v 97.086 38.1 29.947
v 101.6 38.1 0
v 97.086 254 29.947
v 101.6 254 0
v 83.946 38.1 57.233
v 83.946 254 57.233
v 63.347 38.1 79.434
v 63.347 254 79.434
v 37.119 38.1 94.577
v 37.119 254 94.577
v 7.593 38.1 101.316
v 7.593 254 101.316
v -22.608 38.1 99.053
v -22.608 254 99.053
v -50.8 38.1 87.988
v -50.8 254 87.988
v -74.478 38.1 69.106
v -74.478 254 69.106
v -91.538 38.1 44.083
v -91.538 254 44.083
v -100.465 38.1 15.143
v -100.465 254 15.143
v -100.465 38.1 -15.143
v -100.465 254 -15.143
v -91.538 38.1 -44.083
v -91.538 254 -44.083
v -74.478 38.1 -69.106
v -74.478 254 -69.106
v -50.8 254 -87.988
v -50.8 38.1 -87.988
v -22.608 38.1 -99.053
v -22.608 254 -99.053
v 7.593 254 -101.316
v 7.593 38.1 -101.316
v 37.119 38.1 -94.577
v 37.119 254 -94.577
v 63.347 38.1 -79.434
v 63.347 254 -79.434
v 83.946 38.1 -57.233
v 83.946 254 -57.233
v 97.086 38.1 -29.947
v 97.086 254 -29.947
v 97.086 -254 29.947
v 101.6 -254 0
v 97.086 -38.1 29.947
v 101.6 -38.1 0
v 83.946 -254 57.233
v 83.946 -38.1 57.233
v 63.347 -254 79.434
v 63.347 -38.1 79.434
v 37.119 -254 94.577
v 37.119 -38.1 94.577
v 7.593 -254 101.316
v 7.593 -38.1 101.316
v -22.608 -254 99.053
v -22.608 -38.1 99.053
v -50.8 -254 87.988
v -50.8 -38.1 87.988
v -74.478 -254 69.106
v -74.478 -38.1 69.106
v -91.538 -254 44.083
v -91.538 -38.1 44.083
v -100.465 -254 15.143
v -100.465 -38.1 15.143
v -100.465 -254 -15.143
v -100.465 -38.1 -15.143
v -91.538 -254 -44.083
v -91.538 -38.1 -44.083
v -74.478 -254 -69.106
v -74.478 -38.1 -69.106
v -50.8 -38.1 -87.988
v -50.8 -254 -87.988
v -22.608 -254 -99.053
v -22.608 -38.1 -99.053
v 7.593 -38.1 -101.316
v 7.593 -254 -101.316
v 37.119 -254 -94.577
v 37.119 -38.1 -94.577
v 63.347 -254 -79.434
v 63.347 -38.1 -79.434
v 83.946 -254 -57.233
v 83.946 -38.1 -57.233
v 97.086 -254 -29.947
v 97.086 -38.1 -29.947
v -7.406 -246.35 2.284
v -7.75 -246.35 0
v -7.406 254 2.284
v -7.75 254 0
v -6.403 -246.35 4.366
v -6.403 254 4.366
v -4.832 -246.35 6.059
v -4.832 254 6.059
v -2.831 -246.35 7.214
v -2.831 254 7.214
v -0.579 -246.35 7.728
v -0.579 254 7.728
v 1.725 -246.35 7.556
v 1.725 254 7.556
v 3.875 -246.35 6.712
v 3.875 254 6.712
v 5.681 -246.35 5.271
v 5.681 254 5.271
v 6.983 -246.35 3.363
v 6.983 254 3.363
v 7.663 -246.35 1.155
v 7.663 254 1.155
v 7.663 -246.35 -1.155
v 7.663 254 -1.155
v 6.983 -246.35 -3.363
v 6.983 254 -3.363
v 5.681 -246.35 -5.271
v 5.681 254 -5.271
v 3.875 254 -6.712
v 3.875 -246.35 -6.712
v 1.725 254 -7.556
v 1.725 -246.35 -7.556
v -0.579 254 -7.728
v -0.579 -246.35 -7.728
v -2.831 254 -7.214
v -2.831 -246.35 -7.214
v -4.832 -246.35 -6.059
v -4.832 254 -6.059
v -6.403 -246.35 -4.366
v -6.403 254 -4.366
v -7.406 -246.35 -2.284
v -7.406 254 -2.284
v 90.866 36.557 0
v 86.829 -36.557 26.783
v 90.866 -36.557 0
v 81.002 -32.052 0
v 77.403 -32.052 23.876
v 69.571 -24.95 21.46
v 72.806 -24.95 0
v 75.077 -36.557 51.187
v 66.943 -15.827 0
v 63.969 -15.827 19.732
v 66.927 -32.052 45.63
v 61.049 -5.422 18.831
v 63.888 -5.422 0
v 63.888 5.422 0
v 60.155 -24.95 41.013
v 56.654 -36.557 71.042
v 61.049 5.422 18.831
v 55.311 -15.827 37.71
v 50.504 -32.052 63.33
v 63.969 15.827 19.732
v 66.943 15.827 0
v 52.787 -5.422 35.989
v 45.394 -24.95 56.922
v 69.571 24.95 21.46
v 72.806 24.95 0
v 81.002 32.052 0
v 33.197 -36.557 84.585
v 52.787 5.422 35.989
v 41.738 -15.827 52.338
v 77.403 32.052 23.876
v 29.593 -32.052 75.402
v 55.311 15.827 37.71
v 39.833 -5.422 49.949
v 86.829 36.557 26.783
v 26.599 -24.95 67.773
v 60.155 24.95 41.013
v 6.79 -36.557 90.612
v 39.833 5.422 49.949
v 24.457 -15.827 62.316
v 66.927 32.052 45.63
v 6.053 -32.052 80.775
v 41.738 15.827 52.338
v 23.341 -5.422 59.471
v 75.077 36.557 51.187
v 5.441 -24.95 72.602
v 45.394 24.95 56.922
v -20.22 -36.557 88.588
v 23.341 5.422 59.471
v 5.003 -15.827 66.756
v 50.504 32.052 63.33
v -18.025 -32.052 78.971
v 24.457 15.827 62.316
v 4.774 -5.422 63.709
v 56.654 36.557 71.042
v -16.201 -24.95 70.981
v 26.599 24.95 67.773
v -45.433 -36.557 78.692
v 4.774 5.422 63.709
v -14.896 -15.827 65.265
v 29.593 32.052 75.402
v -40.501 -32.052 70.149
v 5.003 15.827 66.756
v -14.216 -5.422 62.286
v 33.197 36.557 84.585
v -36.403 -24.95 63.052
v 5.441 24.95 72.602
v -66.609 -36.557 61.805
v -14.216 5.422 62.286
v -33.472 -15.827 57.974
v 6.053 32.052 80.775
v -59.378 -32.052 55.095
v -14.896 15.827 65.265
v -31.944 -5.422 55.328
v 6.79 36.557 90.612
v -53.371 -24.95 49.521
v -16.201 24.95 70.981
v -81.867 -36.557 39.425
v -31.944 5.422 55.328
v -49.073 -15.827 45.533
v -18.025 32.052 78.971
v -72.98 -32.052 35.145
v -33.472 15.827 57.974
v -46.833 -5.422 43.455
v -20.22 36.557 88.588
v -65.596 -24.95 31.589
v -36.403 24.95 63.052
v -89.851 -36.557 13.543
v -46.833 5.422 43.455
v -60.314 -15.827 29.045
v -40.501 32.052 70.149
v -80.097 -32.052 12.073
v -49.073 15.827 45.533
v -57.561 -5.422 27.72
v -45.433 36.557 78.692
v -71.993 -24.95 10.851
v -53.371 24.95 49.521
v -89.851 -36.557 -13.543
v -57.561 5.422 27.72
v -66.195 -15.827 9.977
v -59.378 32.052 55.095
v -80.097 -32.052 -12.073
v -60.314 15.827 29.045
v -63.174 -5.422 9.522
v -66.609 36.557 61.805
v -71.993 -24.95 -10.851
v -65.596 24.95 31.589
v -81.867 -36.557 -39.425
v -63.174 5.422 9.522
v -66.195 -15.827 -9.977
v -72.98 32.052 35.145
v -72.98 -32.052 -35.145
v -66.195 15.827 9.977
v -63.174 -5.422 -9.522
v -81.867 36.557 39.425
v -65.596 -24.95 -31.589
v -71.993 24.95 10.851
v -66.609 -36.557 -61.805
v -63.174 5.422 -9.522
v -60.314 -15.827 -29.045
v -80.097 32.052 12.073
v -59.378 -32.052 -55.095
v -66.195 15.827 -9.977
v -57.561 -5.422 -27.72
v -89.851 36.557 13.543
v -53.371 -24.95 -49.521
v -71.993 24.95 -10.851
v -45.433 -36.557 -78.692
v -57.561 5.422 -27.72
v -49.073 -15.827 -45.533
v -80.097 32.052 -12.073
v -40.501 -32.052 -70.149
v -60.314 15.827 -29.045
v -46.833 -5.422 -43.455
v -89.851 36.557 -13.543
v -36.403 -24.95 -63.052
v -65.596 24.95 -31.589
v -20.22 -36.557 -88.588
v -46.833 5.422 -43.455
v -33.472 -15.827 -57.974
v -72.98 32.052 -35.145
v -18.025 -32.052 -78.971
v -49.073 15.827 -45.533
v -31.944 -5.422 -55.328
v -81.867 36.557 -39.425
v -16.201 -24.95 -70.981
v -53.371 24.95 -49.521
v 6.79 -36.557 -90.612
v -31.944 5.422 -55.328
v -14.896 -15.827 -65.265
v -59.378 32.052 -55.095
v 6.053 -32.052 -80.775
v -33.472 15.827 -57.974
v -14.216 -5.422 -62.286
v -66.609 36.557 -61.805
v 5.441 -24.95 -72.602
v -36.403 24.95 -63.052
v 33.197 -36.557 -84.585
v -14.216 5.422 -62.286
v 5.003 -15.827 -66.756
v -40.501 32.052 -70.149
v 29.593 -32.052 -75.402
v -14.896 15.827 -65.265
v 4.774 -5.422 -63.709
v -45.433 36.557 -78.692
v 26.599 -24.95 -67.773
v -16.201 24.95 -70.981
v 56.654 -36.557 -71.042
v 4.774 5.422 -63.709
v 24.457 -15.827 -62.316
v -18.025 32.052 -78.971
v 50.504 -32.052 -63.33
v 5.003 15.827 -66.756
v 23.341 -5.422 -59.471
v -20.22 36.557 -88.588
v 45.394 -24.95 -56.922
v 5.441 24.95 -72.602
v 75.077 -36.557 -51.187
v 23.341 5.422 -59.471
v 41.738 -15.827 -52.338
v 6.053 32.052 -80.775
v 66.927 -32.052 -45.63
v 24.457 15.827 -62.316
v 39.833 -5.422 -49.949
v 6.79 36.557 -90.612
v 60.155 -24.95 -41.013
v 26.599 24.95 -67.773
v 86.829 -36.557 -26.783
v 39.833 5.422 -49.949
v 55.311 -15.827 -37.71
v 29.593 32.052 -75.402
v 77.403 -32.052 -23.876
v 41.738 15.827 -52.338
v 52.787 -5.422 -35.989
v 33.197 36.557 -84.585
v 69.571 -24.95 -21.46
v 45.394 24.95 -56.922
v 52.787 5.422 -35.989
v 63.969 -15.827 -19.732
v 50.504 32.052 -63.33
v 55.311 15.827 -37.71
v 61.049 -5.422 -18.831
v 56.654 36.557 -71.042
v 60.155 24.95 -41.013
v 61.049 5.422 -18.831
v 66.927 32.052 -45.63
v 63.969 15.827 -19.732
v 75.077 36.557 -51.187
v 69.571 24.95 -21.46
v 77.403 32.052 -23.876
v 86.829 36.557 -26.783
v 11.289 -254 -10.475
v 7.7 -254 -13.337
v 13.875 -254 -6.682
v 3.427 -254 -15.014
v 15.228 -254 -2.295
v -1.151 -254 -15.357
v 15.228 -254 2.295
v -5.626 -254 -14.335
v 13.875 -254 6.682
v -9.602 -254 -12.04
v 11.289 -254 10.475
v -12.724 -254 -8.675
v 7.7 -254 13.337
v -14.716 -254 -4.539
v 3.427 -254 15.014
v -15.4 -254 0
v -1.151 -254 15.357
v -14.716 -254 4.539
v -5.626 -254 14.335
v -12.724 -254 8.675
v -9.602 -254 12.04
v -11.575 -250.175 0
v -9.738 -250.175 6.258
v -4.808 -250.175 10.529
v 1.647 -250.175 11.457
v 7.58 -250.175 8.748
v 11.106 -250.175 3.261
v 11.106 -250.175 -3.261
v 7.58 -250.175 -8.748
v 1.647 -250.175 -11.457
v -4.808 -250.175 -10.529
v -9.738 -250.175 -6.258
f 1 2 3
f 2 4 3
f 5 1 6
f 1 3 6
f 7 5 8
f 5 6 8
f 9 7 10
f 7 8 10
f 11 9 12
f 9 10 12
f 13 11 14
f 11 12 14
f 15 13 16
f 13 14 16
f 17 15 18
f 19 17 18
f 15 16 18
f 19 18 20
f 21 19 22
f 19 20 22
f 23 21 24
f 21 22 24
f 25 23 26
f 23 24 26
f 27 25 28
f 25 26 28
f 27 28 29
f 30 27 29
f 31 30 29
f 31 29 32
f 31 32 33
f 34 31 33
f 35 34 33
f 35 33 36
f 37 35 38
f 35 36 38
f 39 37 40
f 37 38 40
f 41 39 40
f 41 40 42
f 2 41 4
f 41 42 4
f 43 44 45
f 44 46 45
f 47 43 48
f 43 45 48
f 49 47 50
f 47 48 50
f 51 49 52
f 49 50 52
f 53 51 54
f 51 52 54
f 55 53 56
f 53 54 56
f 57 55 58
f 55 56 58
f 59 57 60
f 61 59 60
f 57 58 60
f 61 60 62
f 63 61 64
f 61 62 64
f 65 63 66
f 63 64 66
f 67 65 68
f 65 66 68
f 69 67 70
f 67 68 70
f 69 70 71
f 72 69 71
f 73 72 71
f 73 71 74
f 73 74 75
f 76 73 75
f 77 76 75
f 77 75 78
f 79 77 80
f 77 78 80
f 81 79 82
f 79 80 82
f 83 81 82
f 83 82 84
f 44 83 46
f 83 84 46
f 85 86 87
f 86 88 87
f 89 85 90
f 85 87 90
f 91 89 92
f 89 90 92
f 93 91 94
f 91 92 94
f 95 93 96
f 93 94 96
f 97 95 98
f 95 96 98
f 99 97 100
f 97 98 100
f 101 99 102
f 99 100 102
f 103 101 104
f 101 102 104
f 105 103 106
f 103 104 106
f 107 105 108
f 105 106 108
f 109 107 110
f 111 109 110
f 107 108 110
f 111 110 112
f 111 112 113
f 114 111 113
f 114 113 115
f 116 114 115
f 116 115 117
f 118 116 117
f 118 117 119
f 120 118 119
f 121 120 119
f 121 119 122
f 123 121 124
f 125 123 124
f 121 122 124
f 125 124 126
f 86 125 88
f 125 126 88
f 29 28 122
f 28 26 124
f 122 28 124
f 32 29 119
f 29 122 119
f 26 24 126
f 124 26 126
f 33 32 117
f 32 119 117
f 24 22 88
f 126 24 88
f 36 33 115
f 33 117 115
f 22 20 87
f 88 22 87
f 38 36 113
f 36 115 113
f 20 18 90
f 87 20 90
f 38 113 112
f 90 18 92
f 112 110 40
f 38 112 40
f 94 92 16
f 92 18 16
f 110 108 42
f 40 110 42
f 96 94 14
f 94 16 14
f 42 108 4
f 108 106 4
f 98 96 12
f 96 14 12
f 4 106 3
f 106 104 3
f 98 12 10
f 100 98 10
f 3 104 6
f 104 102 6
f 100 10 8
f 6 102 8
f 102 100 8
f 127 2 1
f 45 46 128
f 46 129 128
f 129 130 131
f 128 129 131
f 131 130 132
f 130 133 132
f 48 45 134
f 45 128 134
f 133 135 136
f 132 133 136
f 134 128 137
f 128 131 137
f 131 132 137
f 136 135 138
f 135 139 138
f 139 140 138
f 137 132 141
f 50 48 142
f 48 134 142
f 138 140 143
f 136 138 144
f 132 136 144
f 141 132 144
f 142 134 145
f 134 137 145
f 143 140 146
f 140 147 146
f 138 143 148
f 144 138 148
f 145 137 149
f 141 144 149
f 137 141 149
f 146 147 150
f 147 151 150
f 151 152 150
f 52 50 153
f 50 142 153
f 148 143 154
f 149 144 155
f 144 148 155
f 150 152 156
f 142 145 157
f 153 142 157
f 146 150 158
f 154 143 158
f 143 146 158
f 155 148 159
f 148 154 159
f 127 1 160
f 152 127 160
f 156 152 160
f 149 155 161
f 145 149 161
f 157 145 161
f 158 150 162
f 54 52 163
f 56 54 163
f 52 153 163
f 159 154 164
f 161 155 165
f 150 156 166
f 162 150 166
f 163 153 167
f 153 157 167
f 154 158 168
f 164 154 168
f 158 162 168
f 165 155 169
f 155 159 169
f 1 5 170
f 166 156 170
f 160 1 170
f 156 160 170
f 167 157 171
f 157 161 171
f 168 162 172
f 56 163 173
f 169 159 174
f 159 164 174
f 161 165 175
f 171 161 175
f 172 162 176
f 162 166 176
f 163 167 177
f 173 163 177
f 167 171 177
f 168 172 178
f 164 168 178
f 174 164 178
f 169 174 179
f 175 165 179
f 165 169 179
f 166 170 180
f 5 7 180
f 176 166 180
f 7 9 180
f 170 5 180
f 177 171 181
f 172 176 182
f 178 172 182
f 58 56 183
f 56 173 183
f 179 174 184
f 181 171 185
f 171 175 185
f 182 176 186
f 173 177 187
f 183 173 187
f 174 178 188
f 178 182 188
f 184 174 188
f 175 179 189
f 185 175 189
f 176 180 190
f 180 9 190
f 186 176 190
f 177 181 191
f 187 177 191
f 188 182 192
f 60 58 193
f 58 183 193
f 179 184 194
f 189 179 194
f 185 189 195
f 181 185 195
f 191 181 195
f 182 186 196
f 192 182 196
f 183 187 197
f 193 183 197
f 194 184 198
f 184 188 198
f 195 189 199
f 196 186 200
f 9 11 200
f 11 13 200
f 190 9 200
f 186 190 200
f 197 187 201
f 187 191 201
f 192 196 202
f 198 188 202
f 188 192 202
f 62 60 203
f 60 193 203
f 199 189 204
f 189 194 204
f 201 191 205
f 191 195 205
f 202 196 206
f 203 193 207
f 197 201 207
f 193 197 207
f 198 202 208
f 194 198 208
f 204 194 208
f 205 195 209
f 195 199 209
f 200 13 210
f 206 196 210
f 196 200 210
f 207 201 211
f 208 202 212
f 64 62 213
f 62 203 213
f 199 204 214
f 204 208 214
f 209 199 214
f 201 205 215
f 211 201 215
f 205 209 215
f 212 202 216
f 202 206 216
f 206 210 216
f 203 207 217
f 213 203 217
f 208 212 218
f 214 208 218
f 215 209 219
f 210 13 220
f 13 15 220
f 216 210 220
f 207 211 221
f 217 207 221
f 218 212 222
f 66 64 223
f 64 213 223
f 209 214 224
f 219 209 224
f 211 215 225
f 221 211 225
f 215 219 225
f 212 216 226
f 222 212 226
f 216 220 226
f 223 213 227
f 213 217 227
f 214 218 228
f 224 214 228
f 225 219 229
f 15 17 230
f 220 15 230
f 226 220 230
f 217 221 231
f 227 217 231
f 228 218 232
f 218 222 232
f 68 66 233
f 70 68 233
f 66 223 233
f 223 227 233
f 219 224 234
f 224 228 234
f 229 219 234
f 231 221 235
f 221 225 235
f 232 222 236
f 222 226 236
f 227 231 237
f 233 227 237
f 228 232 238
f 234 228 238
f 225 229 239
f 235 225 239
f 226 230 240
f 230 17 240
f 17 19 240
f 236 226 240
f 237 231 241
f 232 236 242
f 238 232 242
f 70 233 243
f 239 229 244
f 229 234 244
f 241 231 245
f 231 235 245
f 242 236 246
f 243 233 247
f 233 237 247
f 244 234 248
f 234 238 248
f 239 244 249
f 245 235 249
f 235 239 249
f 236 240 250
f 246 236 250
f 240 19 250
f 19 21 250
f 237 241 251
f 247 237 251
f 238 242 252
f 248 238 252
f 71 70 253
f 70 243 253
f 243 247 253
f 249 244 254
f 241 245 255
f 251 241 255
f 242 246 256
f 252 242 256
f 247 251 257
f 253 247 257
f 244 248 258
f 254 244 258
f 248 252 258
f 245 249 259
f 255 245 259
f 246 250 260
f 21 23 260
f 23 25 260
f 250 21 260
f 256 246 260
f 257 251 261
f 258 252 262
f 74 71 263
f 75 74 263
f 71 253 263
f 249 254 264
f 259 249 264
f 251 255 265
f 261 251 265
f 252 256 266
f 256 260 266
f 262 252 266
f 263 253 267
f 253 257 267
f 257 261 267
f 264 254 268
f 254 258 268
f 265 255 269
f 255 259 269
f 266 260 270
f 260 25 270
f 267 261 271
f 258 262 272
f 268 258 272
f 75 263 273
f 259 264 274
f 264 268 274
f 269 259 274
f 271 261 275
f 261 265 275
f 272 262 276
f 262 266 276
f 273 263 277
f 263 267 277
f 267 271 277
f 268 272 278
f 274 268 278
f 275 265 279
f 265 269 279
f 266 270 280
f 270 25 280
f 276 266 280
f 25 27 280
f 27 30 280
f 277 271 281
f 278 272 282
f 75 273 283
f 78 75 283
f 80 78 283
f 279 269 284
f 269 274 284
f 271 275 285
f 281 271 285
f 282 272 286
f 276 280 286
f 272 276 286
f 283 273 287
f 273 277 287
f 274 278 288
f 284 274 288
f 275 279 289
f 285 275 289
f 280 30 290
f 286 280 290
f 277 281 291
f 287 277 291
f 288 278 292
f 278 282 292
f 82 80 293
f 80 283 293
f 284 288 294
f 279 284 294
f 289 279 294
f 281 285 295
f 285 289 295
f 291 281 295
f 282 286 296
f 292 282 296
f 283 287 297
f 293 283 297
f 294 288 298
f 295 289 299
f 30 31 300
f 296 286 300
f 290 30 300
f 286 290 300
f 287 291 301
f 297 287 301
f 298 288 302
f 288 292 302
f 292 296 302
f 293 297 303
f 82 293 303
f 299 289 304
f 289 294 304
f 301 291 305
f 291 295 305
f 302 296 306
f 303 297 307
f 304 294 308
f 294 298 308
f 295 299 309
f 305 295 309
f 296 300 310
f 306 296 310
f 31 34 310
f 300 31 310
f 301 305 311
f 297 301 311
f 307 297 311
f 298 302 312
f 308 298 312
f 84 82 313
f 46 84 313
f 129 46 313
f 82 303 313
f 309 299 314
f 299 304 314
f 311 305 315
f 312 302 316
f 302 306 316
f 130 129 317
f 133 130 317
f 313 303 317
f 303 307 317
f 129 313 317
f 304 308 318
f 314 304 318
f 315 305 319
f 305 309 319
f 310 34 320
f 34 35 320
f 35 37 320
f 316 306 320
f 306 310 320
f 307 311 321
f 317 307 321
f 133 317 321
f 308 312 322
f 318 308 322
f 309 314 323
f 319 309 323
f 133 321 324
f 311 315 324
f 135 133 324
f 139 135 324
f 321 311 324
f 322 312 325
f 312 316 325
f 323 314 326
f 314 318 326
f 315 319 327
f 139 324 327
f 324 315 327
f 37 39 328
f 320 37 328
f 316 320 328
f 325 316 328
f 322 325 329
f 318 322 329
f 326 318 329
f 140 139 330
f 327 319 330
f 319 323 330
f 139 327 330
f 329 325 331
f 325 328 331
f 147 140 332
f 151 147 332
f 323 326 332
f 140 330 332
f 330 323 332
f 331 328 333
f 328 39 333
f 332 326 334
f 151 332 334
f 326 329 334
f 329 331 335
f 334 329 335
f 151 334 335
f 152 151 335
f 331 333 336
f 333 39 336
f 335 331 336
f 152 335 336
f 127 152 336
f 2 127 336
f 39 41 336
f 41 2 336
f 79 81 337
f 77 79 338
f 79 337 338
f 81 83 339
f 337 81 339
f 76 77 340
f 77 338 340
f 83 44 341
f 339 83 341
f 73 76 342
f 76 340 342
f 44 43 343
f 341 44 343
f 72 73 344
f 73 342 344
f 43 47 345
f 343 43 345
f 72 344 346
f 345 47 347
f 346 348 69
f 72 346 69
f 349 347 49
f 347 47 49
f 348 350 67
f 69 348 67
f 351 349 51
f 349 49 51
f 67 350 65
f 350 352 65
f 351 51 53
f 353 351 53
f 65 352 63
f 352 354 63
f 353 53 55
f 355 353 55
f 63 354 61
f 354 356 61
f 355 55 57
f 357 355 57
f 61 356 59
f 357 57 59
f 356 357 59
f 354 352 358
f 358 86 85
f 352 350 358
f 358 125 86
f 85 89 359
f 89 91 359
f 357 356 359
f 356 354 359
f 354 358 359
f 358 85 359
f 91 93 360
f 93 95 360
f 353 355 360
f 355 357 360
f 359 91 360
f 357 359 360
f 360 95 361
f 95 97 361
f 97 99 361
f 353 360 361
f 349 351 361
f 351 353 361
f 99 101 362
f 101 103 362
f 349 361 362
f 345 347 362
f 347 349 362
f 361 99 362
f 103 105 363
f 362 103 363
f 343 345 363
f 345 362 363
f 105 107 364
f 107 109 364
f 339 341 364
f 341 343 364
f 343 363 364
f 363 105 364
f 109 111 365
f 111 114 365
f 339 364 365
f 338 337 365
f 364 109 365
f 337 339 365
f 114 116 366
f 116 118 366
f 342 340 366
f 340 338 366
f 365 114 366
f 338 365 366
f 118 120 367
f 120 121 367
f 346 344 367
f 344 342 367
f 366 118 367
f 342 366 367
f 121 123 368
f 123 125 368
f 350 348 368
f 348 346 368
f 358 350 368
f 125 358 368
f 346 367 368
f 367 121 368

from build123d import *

# Parameters (mm, degrees)
F3_D           = 15.5
F3_CSINK_D     = 30.8
F3_CSINK_ANGLE = 90


with BuildPart() as f1:
    # F0 (on Top) → F1 (revolve)
    with BuildSketch(Plane.XY):
        with BuildLine():
            Line((101.6, 254), (0, 254))
            Line((0, 254), (0, -254))
            Line((0, -254), (101.6, -254))
            Line((101.6, -254), (101.6, -38.1))
            ThreePointArc((101.6, -38.1), (63.5, 0), (101.6, 38.1))
            Line((101.6, 38.1), (101.6, 254))
        make_face()
    revolve(axis=Axis((0, 0, 0), (0, -1, 0)))

    # F3 (through all)
    with Locations(Plane.XZ.offset(254)):
        with Locations((0, 0)):
            CounterSinkHole(F3_D / 2, F3_CSINK_D / 2, counter_sink_angle=F3_CSINK_ANGLE)


solid = f1.part
